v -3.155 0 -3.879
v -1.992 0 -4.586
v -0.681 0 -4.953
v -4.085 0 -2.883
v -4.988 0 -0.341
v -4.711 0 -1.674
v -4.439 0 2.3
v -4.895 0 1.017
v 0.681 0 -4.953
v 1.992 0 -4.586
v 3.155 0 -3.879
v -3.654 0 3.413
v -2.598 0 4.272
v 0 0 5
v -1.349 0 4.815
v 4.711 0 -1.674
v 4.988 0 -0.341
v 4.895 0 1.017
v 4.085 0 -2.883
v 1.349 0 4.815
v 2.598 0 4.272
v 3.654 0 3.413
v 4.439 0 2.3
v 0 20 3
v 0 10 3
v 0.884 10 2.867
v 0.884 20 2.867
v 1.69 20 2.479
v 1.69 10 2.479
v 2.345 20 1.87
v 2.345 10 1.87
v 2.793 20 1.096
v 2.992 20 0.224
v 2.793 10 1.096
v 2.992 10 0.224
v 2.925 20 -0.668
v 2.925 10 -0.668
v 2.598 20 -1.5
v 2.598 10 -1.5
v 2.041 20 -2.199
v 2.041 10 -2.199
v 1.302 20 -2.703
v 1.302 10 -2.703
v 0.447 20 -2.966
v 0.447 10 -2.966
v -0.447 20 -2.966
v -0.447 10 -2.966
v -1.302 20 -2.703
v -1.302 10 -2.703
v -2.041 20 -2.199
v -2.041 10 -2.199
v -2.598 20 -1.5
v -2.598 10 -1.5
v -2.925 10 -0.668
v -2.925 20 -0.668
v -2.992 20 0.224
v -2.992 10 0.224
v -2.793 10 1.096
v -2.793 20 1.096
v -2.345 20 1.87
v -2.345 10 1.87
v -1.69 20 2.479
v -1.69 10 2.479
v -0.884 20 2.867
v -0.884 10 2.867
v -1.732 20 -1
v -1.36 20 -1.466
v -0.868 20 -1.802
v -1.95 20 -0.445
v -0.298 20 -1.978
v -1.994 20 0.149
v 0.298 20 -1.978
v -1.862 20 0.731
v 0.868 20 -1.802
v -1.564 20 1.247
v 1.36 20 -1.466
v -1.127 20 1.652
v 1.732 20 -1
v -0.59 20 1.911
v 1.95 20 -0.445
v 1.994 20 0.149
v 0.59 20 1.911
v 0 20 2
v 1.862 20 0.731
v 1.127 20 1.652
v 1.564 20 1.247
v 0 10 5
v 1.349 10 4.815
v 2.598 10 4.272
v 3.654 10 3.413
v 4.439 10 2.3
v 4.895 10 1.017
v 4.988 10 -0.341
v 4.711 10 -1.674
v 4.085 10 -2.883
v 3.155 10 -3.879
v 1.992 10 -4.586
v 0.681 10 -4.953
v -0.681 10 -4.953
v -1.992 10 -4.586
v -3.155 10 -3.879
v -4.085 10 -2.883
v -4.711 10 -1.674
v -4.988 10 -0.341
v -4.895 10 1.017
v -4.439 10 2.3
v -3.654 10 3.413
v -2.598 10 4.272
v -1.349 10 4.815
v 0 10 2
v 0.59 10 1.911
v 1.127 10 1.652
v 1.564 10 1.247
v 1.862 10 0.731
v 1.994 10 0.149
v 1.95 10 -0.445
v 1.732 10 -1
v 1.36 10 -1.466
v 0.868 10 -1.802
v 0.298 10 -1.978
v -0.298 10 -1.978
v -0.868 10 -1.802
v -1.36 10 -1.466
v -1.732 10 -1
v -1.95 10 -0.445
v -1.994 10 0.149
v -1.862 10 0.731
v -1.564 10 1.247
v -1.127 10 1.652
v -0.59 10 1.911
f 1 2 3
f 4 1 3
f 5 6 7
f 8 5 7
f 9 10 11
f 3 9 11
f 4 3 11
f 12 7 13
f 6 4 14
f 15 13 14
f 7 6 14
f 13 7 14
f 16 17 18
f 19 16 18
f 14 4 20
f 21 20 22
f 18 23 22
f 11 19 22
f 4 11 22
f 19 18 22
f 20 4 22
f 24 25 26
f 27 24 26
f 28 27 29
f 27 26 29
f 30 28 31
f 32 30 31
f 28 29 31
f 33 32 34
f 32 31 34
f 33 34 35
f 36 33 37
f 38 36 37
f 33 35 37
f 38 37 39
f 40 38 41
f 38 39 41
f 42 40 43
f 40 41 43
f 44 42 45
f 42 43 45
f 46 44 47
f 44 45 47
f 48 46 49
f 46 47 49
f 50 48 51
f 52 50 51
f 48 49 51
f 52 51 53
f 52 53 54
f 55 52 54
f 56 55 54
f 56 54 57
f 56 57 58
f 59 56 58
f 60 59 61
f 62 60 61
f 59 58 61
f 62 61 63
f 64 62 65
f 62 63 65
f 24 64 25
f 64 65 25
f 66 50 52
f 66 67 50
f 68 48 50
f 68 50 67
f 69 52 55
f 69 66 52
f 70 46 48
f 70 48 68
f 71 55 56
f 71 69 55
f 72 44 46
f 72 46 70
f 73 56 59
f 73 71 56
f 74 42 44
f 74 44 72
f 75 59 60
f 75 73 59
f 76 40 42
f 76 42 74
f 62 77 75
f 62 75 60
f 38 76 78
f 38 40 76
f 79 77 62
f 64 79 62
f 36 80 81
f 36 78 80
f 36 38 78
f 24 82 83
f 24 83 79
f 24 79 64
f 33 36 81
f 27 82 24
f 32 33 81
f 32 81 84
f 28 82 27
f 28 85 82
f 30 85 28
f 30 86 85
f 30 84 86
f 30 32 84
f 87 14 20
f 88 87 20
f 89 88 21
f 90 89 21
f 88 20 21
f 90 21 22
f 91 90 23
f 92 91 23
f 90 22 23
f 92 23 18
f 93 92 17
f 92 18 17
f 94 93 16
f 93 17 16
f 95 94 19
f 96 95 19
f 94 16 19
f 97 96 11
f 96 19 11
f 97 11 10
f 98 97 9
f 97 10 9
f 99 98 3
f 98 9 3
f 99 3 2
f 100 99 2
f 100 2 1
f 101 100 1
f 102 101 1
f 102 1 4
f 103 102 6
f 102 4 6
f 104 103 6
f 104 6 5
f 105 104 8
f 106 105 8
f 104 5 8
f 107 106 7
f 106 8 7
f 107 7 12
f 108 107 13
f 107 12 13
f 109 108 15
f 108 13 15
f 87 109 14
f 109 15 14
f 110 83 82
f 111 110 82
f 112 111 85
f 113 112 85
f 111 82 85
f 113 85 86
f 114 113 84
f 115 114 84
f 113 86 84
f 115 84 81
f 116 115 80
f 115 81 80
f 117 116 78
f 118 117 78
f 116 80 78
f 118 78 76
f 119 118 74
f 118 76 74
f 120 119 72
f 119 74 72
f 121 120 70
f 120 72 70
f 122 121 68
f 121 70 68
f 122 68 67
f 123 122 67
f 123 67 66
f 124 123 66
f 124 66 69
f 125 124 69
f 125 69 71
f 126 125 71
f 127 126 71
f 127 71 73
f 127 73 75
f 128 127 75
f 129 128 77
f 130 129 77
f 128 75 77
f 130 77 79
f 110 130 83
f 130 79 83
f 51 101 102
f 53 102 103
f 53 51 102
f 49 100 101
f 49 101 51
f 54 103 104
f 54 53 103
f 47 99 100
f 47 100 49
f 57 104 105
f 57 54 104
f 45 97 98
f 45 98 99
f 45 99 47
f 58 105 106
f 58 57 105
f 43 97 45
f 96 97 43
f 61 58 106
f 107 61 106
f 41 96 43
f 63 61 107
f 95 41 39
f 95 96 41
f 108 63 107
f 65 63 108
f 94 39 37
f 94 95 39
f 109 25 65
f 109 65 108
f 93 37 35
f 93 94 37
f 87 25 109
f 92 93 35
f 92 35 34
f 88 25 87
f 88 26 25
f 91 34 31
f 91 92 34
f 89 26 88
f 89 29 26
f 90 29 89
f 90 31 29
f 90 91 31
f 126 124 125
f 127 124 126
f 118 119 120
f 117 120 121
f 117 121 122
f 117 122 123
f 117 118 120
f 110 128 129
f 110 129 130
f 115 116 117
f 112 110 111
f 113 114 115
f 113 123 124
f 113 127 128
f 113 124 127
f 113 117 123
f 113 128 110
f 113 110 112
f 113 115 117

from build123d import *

# Parameters (mm, degrees)
SKETCH_1_R          = 5
EXTRUDE_1_DEPTH     = 10
SKETCH_2_R          = 3
EXTRUDE_2_DEPTH     = 10
SKETCH_3_R          = 2
CUT_EXTRUDE_1_DEPTH = 10


with BuildPart() as part:
    # 草图1 → 凸台-拉伸1 (new body)
    with BuildSketch(Plane(origin=(0, 0, 0), x_dir=(1, 0, 0), z_dir=(0, 1, 0))):
        with Locations(Location((0, 0, 0), (0, 0, 270))):
            Circle(SKETCH_1_R)
    extrude(amount=EXTRUDE_1_DEPTH)

    # 草图2 → 凸台-拉伸2 (add)
    with BuildSketch(Plane(origin=(0, 10, 0), x_dir=(1, 0, 0), z_dir=(0, 1, 0))):
        with Locations(Location((0, 0, 0), (0, 0, 270))):
            Circle(SKETCH_2_R)
    extrude(amount=EXTRUDE_2_DEPTH)

    # 草图3 → 切除-拉伸1 (cut)
    with BuildSketch(Plane(origin=(0, 20, 0), x_dir=(1, 0, 0), z_dir=(0, 1, 0))):
        with Locations(Location((0, 0, 0), (0, 0, 270))):
            Circle(SKETCH_3_R)
    extrude(amount=-CUT_EXTRUDE_1_DEPTH, mode=Mode.SUBTRACT)


solid = part.part
